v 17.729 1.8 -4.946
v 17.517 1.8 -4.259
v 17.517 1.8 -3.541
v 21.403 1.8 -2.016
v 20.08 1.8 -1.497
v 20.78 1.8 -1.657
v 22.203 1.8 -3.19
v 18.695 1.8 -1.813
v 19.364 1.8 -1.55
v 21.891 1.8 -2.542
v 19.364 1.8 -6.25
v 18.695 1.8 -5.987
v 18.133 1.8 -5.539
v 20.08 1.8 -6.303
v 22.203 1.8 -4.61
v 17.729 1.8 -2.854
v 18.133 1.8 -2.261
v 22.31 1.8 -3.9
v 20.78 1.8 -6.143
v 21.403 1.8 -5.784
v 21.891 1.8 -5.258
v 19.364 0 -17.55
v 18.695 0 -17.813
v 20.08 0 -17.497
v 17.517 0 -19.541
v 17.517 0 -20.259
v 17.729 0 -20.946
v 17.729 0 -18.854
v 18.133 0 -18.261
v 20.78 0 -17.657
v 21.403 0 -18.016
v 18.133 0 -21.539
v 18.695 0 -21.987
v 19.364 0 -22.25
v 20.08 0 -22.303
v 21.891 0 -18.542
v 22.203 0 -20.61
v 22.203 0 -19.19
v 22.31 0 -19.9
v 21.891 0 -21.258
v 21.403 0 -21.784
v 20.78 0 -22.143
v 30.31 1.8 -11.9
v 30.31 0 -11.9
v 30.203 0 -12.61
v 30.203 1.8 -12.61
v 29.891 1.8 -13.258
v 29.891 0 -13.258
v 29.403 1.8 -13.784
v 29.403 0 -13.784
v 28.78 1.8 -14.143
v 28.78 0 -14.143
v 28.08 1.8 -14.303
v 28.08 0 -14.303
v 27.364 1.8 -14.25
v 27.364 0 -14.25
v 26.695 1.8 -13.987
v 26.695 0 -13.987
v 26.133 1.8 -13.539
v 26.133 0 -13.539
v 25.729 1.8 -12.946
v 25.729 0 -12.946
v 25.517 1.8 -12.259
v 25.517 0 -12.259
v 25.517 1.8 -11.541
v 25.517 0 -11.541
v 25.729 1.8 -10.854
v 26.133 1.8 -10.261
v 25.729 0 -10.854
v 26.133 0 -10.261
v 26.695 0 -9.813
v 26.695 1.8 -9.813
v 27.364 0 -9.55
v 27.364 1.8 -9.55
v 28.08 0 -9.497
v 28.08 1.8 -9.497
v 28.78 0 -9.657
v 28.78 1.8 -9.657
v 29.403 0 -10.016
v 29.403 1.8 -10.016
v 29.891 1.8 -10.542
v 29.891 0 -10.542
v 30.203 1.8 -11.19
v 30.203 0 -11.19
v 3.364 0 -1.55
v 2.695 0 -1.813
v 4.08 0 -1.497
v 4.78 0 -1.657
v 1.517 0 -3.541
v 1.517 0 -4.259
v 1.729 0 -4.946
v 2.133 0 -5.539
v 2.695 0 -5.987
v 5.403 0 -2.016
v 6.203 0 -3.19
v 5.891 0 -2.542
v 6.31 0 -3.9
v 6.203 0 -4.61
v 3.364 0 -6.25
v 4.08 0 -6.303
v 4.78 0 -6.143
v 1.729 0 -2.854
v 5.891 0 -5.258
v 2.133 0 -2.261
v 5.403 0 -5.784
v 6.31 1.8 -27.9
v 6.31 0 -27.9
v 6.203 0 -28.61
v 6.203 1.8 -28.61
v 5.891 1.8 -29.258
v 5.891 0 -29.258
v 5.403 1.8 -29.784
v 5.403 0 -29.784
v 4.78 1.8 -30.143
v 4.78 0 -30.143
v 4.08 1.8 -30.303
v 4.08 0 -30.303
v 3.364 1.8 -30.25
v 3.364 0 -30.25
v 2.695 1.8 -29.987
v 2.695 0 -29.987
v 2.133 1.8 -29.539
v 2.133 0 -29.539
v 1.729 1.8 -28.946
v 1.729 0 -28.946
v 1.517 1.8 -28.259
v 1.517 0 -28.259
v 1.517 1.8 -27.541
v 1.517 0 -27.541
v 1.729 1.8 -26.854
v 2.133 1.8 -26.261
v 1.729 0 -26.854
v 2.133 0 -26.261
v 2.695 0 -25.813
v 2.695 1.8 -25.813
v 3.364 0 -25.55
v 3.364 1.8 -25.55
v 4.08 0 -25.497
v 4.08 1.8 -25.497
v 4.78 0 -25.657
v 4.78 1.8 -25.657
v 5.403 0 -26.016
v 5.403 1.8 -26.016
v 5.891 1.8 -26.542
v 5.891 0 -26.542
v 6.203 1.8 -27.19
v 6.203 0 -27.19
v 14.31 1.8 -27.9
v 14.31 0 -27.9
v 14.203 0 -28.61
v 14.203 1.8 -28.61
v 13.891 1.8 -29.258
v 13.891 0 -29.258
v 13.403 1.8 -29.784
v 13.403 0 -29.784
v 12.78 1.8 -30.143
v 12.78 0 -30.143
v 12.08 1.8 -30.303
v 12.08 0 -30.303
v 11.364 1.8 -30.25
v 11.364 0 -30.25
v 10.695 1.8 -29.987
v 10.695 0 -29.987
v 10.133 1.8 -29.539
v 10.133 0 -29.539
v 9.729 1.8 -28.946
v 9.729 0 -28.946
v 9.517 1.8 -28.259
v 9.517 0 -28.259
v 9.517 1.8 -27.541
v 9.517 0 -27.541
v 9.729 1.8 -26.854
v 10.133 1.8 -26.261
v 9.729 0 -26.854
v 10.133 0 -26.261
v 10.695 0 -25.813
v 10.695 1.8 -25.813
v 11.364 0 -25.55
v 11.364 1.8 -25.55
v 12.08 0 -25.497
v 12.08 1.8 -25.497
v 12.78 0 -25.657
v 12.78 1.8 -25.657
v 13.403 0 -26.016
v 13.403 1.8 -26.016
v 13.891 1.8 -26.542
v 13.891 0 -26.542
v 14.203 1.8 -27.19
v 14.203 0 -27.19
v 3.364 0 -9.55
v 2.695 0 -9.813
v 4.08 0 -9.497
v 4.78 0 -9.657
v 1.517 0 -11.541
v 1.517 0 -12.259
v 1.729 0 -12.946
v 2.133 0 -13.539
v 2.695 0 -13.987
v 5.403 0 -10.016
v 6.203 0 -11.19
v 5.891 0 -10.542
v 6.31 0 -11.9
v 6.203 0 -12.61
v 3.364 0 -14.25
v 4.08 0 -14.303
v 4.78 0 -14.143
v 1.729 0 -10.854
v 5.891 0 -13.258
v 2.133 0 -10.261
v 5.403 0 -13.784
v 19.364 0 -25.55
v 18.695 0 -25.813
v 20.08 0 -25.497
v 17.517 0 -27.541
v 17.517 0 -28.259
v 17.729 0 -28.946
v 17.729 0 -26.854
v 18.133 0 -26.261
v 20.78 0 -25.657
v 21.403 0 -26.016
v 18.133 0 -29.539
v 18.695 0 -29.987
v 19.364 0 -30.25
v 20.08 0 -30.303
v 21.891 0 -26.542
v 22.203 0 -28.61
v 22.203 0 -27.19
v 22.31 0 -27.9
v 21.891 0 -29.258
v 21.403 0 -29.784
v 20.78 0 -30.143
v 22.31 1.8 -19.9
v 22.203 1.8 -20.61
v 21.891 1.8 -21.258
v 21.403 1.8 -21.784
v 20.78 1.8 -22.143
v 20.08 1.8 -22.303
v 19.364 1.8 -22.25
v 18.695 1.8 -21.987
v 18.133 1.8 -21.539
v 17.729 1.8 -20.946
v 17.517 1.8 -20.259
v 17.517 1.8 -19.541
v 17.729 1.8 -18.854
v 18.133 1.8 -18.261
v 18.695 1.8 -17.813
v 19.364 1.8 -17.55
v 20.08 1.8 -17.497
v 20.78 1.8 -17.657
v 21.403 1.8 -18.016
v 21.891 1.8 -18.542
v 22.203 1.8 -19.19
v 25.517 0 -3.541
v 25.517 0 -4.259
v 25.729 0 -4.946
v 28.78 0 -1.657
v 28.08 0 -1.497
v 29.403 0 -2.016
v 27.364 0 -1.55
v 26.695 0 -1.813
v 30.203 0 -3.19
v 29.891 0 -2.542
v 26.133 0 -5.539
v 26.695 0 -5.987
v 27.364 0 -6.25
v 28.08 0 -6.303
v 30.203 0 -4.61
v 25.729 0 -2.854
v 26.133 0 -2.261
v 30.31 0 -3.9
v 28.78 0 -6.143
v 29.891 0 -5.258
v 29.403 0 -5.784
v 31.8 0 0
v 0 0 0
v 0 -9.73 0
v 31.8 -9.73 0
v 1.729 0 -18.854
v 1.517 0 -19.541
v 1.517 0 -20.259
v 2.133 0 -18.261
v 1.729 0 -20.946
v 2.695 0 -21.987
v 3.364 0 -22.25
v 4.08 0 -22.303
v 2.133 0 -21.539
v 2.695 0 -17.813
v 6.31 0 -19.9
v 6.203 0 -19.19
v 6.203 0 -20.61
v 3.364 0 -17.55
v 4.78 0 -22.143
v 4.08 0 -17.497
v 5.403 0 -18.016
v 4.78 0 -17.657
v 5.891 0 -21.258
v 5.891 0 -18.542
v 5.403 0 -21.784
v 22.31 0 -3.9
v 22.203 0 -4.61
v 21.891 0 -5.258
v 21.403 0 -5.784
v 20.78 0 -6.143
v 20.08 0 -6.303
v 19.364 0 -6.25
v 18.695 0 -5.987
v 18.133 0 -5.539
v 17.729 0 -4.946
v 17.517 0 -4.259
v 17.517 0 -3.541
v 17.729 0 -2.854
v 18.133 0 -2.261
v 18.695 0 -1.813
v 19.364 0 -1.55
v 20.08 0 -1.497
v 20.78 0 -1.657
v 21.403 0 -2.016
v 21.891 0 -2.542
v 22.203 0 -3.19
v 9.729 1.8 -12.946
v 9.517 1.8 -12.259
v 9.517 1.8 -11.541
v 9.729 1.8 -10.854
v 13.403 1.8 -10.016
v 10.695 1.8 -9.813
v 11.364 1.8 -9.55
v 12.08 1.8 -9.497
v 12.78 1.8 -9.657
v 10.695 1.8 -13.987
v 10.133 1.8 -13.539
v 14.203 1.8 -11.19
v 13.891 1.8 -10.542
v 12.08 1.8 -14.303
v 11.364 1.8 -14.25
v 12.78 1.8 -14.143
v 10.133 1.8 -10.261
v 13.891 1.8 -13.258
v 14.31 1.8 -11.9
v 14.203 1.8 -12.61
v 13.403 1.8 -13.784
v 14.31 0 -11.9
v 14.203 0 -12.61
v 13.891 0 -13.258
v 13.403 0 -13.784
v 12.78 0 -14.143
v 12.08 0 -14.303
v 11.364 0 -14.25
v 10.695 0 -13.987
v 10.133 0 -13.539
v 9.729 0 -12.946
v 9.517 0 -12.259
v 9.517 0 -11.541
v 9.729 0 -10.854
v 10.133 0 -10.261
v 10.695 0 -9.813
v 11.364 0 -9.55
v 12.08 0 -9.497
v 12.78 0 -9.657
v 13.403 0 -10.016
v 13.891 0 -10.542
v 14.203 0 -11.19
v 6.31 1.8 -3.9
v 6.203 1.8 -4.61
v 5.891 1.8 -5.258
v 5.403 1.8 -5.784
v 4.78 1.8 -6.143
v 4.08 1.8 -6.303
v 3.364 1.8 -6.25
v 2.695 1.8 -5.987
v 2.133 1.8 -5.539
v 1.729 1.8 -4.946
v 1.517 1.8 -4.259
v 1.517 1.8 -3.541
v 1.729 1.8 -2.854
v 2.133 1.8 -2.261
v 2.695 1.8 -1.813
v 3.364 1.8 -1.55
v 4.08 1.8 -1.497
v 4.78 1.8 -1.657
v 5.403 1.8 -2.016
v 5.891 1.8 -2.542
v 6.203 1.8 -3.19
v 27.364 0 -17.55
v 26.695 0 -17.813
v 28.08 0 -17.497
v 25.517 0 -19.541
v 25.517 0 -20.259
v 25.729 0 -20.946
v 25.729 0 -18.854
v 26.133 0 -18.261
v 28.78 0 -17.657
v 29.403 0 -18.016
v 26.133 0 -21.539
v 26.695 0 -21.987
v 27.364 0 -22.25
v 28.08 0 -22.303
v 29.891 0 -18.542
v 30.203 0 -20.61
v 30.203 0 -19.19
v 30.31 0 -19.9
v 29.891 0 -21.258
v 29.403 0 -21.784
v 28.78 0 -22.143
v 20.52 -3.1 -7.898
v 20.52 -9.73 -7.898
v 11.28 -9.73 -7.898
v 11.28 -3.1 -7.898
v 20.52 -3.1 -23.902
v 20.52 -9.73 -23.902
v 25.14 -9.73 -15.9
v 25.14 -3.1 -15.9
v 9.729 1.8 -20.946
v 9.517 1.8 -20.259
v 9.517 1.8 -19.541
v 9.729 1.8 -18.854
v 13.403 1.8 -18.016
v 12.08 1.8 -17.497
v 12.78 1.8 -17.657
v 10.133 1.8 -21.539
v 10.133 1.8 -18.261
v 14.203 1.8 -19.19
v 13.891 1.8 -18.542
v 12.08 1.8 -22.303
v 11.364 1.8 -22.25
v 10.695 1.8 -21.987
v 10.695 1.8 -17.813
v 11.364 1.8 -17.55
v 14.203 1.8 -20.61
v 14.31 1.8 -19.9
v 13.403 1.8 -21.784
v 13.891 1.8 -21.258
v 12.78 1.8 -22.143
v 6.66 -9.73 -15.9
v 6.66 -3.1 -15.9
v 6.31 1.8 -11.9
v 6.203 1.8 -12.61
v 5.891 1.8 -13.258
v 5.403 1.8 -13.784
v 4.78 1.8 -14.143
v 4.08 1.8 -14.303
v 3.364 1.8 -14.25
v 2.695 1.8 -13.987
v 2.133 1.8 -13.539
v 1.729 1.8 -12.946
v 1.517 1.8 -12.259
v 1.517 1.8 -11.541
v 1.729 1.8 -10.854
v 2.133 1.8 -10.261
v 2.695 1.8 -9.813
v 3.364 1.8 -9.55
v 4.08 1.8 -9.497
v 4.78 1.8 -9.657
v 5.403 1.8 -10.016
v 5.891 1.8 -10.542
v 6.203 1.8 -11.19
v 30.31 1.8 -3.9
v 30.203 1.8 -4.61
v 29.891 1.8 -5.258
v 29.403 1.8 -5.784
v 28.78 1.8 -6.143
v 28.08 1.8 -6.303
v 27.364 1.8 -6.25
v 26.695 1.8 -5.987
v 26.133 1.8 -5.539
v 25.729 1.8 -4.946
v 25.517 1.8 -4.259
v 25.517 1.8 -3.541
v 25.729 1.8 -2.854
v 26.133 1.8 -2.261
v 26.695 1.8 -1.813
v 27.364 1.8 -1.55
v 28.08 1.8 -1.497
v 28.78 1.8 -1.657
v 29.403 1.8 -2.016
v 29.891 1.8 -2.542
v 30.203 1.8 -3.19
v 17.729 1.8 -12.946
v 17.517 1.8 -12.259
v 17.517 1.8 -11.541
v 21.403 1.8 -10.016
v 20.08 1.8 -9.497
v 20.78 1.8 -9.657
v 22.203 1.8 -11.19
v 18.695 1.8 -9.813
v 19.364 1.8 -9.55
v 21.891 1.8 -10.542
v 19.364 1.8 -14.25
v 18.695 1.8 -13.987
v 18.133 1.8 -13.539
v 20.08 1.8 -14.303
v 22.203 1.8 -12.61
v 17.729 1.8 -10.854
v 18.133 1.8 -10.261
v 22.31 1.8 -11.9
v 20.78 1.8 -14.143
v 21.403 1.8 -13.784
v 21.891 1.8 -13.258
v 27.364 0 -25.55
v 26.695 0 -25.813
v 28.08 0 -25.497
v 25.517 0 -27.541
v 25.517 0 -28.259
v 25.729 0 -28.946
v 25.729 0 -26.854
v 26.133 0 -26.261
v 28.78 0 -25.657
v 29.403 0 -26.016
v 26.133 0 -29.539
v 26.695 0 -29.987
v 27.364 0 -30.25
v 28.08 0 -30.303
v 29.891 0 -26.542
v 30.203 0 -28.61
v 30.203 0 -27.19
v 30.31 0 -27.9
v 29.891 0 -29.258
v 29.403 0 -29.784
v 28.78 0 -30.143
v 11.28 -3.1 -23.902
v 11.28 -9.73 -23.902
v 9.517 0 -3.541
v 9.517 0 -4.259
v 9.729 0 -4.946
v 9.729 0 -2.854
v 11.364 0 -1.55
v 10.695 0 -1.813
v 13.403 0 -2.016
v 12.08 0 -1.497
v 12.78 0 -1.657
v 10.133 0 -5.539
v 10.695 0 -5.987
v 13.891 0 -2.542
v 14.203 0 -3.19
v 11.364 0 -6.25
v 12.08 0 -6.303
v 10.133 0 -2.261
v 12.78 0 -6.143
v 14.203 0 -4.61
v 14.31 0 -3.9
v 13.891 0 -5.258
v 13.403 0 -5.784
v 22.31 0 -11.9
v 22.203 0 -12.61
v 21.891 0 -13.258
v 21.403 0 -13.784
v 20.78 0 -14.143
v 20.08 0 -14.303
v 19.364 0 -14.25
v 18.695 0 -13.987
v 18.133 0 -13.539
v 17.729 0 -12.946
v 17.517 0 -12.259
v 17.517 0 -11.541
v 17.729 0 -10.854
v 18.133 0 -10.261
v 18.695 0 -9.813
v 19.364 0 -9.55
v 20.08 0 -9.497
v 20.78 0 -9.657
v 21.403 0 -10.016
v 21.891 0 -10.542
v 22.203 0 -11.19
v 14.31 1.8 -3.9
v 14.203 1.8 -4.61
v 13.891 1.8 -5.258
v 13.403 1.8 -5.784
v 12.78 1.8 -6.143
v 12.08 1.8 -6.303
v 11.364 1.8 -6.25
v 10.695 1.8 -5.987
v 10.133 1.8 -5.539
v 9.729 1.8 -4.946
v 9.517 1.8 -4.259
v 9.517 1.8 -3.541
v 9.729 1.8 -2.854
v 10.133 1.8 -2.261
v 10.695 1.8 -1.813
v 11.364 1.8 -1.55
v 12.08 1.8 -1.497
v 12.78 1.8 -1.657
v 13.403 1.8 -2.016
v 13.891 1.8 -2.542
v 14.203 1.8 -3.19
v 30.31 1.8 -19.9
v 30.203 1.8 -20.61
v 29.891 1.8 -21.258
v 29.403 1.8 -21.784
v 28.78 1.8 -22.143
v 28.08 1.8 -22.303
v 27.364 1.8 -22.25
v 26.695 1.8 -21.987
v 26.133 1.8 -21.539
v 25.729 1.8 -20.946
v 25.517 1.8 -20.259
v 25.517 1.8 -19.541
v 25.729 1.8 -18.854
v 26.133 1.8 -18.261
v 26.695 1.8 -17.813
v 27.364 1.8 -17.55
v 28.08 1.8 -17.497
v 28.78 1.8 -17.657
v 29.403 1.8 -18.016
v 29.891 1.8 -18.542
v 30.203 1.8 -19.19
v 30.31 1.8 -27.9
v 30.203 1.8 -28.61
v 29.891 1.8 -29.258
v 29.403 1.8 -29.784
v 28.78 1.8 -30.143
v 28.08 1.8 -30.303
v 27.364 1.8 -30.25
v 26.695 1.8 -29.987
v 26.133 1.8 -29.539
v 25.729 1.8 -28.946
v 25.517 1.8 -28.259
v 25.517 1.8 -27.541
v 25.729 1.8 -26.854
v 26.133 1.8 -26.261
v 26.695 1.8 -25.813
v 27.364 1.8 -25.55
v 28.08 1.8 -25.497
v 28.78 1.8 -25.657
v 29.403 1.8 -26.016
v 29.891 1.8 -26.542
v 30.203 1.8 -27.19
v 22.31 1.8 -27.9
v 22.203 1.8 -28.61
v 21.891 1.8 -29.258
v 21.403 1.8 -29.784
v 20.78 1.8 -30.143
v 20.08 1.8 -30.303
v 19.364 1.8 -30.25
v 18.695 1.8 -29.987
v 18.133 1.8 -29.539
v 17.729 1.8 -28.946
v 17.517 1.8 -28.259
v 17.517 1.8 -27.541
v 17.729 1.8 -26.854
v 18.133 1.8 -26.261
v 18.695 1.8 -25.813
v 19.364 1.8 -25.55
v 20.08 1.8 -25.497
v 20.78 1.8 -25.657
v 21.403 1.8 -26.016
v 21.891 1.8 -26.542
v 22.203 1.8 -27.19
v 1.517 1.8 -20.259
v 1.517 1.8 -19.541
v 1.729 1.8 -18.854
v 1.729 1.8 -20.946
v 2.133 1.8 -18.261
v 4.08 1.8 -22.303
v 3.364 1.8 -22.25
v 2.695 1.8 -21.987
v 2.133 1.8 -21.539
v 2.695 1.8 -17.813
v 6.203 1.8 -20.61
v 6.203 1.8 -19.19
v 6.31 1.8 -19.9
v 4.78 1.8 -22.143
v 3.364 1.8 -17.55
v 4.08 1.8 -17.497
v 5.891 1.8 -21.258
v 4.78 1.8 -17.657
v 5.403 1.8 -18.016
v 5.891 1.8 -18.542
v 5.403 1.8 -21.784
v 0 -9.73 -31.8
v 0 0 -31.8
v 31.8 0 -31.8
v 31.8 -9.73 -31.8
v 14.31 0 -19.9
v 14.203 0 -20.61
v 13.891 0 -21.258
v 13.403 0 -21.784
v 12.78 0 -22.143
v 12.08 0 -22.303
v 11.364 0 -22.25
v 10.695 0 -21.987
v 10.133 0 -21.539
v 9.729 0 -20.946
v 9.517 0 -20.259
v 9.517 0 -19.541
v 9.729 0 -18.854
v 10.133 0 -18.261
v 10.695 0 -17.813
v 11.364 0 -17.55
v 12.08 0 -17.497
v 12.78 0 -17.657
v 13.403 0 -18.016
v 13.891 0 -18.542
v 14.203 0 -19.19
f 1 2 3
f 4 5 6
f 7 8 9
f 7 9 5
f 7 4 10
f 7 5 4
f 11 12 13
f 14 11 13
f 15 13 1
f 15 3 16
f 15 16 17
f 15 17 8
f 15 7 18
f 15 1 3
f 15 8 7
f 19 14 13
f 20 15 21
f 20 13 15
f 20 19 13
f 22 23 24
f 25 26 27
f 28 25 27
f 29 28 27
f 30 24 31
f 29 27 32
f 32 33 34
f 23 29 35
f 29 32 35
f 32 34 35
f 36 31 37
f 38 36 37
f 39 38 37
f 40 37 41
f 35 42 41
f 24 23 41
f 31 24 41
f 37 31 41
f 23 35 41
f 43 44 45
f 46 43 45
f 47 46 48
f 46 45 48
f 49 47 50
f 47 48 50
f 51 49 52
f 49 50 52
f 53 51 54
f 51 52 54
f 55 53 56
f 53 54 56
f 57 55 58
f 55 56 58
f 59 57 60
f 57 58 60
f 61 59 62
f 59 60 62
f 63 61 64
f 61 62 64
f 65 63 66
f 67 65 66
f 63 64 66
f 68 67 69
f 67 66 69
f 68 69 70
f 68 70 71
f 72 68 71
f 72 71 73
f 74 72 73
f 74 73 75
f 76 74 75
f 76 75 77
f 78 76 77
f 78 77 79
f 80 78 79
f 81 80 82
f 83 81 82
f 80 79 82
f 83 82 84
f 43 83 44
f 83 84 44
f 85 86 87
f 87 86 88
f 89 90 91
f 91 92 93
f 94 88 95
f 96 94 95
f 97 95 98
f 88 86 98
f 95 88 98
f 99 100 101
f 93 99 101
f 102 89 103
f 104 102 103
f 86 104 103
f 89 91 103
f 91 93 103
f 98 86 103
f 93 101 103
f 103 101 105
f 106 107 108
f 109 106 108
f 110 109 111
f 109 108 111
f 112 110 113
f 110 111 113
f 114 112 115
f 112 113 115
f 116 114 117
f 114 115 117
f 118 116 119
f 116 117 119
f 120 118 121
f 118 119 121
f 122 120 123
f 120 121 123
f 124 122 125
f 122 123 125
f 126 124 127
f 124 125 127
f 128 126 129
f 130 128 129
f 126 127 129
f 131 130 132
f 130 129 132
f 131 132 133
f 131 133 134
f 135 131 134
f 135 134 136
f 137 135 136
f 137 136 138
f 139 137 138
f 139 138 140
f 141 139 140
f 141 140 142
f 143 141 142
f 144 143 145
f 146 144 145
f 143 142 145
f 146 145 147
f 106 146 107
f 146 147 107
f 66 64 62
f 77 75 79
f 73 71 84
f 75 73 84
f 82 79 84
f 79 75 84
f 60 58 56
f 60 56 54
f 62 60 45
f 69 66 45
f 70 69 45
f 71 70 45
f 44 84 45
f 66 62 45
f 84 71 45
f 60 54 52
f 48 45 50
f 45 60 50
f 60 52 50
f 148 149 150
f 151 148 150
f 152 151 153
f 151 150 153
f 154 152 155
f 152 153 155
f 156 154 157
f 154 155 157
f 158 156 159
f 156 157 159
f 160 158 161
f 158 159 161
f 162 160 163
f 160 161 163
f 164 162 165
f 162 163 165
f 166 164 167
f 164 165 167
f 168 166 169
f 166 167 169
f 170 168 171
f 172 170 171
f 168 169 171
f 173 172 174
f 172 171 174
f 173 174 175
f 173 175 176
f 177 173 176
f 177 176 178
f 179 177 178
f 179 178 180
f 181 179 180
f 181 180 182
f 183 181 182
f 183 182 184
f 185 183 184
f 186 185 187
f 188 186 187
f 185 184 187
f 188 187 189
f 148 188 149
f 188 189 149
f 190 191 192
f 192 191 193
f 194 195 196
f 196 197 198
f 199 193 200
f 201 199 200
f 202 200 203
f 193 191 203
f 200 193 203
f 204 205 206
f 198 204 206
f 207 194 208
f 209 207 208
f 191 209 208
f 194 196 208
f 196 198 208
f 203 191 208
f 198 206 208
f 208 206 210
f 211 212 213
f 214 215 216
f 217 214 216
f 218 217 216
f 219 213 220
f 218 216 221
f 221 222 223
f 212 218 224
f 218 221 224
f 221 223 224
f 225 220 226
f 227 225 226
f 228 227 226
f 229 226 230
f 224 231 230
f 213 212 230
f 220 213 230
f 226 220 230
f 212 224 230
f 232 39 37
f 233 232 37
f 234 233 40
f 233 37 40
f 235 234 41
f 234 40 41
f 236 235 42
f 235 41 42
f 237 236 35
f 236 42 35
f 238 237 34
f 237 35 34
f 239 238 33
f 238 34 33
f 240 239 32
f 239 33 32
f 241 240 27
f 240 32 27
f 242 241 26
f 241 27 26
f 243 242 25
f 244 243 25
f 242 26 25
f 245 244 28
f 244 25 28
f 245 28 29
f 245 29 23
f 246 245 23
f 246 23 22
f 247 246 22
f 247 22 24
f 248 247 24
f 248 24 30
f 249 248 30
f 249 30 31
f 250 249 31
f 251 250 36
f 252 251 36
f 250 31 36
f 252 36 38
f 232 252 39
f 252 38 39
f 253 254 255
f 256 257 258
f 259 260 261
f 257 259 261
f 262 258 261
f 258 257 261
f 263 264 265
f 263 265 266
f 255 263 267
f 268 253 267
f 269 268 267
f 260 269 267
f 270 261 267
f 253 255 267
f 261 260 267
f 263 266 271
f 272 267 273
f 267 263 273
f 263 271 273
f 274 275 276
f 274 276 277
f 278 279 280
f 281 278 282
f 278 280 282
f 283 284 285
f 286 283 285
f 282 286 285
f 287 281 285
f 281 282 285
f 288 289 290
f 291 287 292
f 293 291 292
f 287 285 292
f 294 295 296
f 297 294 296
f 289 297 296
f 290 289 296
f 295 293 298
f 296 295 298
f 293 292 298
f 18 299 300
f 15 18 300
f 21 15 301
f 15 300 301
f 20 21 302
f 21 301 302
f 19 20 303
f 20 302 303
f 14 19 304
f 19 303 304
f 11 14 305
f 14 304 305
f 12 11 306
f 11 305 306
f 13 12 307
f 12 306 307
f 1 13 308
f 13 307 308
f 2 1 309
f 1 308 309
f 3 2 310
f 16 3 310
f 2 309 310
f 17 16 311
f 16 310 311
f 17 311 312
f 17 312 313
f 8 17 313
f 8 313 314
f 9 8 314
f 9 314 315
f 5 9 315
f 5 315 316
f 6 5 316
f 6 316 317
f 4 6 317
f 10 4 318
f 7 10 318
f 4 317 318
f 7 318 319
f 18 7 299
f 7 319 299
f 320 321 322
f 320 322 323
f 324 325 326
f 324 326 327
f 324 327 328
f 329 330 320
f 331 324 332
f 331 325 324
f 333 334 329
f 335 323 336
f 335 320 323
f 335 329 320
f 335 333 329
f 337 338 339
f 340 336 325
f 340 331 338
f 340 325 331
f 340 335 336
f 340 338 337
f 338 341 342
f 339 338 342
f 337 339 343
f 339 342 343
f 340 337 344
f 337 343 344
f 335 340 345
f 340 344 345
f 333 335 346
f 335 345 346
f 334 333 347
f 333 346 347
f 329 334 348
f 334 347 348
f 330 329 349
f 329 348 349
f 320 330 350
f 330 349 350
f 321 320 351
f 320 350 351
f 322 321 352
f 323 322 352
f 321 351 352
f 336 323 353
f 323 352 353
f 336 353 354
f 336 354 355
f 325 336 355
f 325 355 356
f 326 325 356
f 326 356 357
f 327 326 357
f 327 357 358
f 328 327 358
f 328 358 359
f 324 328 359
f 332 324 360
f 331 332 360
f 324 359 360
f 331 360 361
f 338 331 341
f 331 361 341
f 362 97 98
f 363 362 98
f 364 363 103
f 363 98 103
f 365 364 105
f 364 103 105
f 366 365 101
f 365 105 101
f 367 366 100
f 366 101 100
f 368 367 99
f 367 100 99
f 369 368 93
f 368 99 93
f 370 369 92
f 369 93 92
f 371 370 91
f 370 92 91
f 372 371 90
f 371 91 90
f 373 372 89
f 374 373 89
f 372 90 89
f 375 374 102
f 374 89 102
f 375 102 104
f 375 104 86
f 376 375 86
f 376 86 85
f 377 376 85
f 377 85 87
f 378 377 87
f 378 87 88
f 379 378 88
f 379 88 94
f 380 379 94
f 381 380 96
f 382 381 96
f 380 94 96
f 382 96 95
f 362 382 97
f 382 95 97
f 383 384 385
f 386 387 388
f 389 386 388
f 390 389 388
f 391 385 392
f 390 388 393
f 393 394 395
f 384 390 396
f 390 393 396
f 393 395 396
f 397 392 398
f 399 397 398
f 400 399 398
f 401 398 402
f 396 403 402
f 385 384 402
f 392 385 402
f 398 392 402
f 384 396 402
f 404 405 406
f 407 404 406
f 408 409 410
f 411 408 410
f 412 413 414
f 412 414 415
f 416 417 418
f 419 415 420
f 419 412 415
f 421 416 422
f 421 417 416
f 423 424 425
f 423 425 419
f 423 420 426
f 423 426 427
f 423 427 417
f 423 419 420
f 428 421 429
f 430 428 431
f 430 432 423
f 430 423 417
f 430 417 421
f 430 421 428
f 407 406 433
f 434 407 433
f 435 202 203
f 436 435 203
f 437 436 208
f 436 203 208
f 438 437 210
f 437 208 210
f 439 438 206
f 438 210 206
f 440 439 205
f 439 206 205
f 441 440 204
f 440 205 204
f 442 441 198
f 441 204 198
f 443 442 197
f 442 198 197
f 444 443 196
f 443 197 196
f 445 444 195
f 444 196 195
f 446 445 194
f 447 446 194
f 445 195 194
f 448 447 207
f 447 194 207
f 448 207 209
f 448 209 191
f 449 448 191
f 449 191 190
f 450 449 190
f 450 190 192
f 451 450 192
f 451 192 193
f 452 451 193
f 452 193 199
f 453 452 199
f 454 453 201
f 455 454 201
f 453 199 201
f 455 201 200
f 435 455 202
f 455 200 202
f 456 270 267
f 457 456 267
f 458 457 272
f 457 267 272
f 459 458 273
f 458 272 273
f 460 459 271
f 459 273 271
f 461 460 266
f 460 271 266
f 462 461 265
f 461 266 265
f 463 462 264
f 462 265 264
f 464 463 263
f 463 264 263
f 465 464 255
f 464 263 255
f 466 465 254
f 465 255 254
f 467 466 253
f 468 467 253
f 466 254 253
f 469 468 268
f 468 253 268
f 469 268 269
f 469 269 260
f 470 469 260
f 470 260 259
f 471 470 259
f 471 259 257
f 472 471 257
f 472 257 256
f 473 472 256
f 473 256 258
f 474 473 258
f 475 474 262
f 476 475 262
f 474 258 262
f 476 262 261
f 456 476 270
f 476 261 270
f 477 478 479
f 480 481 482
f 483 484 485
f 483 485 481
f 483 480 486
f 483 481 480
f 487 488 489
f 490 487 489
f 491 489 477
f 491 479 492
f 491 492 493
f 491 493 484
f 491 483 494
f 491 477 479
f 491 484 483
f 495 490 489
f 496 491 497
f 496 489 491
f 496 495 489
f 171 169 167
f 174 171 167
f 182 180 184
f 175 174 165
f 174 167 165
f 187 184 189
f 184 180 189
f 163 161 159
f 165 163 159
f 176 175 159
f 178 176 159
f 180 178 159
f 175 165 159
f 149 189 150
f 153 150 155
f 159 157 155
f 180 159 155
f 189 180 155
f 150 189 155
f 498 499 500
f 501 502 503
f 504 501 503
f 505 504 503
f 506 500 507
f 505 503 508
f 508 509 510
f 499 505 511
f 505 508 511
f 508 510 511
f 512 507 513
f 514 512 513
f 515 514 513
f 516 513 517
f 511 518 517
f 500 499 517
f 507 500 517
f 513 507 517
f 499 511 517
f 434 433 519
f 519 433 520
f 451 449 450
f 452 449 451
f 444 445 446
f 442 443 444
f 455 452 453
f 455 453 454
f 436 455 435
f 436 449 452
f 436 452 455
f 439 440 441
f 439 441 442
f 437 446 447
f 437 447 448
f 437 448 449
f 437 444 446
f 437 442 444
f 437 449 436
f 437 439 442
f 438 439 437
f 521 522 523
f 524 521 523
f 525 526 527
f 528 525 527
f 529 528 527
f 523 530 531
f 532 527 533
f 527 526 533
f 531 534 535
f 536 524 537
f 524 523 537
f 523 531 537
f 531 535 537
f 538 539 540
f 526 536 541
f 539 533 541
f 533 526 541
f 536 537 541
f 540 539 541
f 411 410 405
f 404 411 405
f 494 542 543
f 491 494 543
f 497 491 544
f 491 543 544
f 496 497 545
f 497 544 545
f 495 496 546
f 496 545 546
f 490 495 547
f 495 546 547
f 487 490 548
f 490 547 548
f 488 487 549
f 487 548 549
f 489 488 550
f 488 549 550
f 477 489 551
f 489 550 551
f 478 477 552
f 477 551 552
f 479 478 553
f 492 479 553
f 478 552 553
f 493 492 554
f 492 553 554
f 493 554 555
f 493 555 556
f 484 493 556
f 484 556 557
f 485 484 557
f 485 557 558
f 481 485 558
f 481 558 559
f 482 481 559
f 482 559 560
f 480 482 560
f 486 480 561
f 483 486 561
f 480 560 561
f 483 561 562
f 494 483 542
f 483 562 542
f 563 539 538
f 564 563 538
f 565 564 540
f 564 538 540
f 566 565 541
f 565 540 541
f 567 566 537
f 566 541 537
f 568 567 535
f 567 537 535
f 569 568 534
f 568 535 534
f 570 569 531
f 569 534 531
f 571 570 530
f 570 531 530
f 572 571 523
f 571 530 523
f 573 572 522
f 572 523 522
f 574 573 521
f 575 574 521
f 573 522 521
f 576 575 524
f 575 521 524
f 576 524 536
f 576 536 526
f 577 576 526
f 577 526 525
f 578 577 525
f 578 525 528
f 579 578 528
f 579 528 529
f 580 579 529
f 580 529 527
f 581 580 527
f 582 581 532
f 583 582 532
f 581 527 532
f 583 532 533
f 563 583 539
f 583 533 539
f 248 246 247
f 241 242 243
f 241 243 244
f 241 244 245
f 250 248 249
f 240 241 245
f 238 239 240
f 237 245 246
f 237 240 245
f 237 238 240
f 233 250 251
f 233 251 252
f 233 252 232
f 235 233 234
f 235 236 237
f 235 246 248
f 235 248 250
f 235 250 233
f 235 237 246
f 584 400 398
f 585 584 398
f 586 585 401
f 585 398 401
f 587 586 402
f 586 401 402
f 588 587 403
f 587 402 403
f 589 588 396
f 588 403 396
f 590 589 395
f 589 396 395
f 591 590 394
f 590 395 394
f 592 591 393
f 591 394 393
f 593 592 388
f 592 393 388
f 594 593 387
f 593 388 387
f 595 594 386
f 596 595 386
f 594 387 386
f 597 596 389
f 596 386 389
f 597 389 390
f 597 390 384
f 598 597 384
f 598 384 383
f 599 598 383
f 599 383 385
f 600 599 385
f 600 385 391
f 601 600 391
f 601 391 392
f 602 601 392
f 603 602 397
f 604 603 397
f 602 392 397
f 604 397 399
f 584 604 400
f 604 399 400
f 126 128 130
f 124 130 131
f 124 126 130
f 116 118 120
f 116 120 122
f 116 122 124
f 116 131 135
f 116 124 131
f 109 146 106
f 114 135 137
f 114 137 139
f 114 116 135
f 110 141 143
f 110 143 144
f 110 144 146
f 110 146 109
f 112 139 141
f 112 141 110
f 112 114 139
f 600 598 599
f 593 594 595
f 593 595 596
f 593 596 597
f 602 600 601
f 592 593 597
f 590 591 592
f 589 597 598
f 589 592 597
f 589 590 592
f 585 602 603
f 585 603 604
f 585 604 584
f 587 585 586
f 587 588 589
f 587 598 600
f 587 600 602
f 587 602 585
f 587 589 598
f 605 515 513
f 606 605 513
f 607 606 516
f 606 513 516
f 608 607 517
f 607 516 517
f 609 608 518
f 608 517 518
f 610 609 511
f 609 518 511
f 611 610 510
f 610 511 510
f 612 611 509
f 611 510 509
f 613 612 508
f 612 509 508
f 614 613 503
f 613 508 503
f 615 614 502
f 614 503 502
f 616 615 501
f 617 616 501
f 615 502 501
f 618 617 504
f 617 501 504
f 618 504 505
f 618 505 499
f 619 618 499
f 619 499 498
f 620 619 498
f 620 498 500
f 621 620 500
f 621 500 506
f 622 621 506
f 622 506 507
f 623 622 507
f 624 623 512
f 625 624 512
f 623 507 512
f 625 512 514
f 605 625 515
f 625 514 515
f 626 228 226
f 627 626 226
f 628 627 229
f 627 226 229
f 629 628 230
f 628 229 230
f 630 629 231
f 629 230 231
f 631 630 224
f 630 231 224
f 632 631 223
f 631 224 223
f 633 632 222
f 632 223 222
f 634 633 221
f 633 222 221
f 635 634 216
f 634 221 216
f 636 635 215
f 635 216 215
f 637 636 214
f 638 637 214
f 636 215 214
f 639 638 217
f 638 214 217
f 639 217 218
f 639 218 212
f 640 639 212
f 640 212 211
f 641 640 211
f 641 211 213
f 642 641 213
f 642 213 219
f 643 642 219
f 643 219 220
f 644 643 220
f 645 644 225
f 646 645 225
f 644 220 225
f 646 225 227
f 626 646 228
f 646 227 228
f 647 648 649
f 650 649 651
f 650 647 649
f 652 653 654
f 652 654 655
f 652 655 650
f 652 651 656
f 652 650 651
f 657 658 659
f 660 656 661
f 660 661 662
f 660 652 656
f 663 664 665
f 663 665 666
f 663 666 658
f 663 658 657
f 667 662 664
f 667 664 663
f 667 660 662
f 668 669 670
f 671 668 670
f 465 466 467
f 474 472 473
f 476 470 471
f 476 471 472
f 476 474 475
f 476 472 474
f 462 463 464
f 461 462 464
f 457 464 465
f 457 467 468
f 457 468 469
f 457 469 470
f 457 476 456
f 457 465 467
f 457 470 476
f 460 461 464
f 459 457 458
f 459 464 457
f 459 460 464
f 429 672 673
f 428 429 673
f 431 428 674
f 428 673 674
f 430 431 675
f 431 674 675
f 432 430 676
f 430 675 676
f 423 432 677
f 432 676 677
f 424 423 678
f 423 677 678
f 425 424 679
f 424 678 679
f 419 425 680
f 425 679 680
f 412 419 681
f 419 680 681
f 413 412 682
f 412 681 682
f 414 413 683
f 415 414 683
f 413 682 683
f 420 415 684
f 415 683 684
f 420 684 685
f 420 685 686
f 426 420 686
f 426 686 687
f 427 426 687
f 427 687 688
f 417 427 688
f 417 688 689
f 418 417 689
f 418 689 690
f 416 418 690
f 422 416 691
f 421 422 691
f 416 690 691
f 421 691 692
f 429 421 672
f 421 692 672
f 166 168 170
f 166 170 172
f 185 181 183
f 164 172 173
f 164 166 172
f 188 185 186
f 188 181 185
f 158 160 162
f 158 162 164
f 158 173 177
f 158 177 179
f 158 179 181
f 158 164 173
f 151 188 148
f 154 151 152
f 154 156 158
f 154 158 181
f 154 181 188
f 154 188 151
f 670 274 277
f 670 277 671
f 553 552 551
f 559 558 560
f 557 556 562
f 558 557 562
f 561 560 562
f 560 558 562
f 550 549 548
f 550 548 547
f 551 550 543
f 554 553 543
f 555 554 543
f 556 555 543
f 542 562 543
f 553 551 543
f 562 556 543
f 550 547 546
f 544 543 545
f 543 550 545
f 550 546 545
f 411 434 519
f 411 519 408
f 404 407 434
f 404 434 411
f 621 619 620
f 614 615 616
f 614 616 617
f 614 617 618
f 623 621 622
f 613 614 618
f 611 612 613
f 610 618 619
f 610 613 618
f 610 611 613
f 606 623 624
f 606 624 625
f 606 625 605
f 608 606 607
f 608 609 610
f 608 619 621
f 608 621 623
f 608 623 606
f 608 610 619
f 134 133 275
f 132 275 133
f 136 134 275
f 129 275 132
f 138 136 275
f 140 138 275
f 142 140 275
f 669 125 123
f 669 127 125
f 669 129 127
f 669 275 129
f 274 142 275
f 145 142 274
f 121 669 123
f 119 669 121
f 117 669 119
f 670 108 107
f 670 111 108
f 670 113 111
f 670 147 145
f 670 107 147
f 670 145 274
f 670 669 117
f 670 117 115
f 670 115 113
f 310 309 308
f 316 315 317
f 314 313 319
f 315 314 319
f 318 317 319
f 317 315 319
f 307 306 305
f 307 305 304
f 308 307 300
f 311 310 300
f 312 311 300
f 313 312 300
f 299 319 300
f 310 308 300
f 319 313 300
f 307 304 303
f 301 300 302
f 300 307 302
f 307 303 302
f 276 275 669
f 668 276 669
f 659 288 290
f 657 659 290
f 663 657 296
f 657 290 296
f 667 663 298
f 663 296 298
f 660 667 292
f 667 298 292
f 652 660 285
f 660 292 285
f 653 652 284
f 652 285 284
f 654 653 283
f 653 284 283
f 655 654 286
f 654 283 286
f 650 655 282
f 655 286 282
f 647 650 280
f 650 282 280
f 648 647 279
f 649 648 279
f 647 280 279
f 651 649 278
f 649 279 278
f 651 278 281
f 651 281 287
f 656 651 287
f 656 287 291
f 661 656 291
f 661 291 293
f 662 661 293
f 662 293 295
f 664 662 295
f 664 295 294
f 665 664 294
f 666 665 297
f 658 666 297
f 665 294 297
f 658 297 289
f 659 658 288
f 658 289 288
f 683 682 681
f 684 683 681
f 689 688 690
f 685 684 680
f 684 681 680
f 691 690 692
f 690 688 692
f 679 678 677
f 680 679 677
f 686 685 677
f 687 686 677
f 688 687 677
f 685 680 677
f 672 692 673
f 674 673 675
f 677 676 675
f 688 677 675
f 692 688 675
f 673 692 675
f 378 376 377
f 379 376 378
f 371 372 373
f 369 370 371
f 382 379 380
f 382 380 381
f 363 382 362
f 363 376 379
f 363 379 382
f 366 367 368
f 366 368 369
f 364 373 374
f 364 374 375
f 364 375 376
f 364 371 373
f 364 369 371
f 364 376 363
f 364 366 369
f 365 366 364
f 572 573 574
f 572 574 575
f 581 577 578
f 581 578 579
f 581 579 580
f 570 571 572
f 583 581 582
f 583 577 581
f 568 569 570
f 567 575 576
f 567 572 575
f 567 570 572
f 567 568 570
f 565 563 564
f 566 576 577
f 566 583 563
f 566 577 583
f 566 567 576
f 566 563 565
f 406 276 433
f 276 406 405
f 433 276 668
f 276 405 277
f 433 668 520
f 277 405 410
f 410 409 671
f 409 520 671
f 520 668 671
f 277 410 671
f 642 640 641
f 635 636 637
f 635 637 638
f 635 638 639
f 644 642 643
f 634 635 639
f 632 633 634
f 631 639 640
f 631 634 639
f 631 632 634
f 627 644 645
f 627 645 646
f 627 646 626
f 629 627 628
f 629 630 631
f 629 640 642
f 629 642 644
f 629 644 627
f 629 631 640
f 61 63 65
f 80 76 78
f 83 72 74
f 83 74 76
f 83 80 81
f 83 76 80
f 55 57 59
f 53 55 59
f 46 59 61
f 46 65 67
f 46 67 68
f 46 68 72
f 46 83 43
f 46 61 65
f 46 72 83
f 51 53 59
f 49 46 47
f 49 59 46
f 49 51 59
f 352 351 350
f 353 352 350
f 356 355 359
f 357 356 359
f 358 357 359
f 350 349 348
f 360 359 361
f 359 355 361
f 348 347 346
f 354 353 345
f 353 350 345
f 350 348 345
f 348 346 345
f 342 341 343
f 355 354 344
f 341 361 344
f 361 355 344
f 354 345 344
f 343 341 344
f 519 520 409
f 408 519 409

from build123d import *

# Parameters (mm, degrees)
SKETCH2_R              = 2.41
BOSS_EXTRUDE1_DEPTH    = 1.8
BOSS_EXTRUDE1_2_DEPTH  = 1.8
BOSS_EXTRUDE1_3_DEPTH  = 1.8
BOSS_EXTRUDE1_4_DEPTH  = 1.8
BOSS_EXTRUDE1_5_DEPTH  = 1.8
BOSS_EXTRUDE1_6_DEPTH  = 1.8
BOSS_EXTRUDE1_7_DEPTH  = 1.8
BOSS_EXTRUDE1_8_DEPTH  = 1.8
BOSS_EXTRUDE1_9_DEPTH  = 1.8
BOSS_EXTRUDE1_10_DEPTH = 1.8
BOSS_EXTRUDE1_11_DEPTH = 1.8
BOSS_EXTRUDE1_12_DEPTH = 1.8
BOSS_EXTRUDE1_13_DEPTH = 1.8
BOSS_EXTRUDE1_14_DEPTH = 1.8
BOSS_EXTRUDE1_15_DEPTH = 1.8
BOSS_EXTRUDE1_16_DEPTH = 1.8
SKETCH1_W              = 31.8
SKETCH1_H              = 31.8
BOSS_EXTRUDE2_DEPTH    = 9.73
CUT_EXTRUDE1_DEPTH     = 6.63


with BuildPart() as part:
    # Sketch2 → Boss-Extrude1 (new body)
    with BuildSketch(Plane(origin=(0, 0, 0), x_dir=(1, 0, 0), z_dir=(0, 1, 0))):
        with Locations((3.9, 27.9)):
            Circle(SKETCH2_R)
    extrude(amount=BOSS_EXTRUDE1_DEPTH)

    # Sketch1 → Boss-Extrude2 (add)
    with BuildSketch(Plane(origin=(0, 0, 0), x_dir=(1, 0, 0), z_dir=(0, 1, 0))):
        with Locations((15.9, 15.9)):
            Rectangle(SKETCH1_W, SKETCH1_H)
    extrude(amount=-BOSS_EXTRUDE2_DEPTH)

    # Sketch4 → Cut-Extrude1 (cut)
    with BuildSketch(Plane.XZ.offset(9.73)):
        Polygon((25.14, -15.9), (20.52, -7.897925269), (11.28, -7.897925269), (6.66, -15.9), (11.28, -23.902074731), (20.52, -23.902074731), align=None)
    extrude(amount=-CUT_EXTRUDE1_DEPTH, mode=Mode.SUBTRACT)


with BuildPart() as body_2:
    # Sketch2 → Boss-Extrude1 2 (new body)
    with BuildSketch(Plane(origin=(0, 0, 0), x_dir=(1, 0, 0), z_dir=(0, 1, 0))):
        with Locations((11.9, 27.9)):
            Circle(SKETCH2_R)
    extrude(amount=BOSS_EXTRUDE1_2_DEPTH)


with BuildPart() as body_3:
    # Sketch2 → Boss-Extrude1 3 (new body)
    with BuildSketch(Plane(origin=(0, 0, 0), x_dir=(1, 0, 0), z_dir=(0, 1, 0))):
        with Locations((19.9, 27.9)):
            Circle(SKETCH2_R)
    extrude(amount=BOSS_EXTRUDE1_3_DEPTH)


with BuildPart() as body_4:
    # Sketch2 → Boss-Extrude1 4 (new body)
    with BuildSketch(Plane(origin=(0, 0, 0), x_dir=(1, 0, 0), z_dir=(0, 1, 0))):
        with Locations((27.9, 27.9)):
            Circle(SKETCH2_R)
    extrude(amount=BOSS_EXTRUDE1_4_DEPTH)


with BuildPart() as body_5:
    # Sketch2 → Boss-Extrude1 5 (new body)
    with BuildSketch(Plane(origin=(0, 0, 0), x_dir=(1, 0, 0), z_dir=(0, 1, 0))):
        with Locations((11.9, 19.9)):
            Circle(SKETCH2_R)
    extrude(amount=BOSS_EXTRUDE1_5_DEPTH)


with BuildPart() as body_6:
    # Sketch2 → Boss-Extrude1 6 (new body)
    with BuildSketch(Plane(origin=(0, 0, 0), x_dir=(1, 0, 0), z_dir=(0, 1, 0))):
        with Locations((19.9, 19.9)):
            Circle(SKETCH2_R)
    extrude(amount=BOSS_EXTRUDE1_6_DEPTH)


with BuildPart() as body_7:
    # Sketch2 → Boss-Extrude1 7 (new body)
    with BuildSketch(Plane(origin=(0, 0, 0), x_dir=(1, 0, 0), z_dir=(0, 1, 0))):
        with Locations((27.9, 19.9)):
            Circle(SKETCH2_R)
    extrude(amount=BOSS_EXTRUDE1_7_DEPTH)


with BuildPart() as body_8:
    # Sketch2 → Boss-Extrude1 8 (new body)
    with BuildSketch(Plane(origin=(0, 0, 0), x_dir=(1, 0, 0), z_dir=(0, 1, 0))):
        with Locations((11.9, 11.9)):
            Circle(SKETCH2_R)
    extrude(amount=BOSS_EXTRUDE1_8_DEPTH)


with BuildPart() as body_9:
    # Sketch2 → Boss-Extrude1 9 (new body)
    with BuildSketch(Plane(origin=(0, 0, 0), x_dir=(1, 0, 0), z_dir=(0, 1, 0))):
        with Locations((19.9, 11.9)):
            Circle(SKETCH2_R)
    extrude(amount=BOSS_EXTRUDE1_9_DEPTH)


with BuildPart() as body_10:
    # Sketch2 → Boss-Extrude1 10 (new body)
    with BuildSketch(Plane(origin=(0, 0, 0), x_dir=(1, 0, 0), z_dir=(0, 1, 0))):
        with Locations((27.9, 11.9)):
            Circle(SKETCH2_R)
    extrude(amount=BOSS_EXTRUDE1_10_DEPTH)


with BuildPart() as body_11:
    # Sketch2 → Boss-Extrude1 11 (new body)
    with BuildSketch(Plane(origin=(0, 0, 0), x_dir=(1, 0, 0), z_dir=(0, 1, 0))):
        with Locations((11.9, 3.9)):
            Circle(SKETCH2_R)
    extrude(amount=BOSS_EXTRUDE1_11_DEPTH)


with BuildPart() as body_12:
    # Sketch2 → Boss-Extrude1 12 (new body)
    with BuildSketch(Plane(origin=(0, 0, 0), x_dir=(1, 0, 0), z_dir=(0, 1, 0))):
        with Locations((19.9, 3.9)):
            Circle(SKETCH2_R)
    extrude(amount=BOSS_EXTRUDE1_12_DEPTH)


with BuildPart() as body_13:
    # Sketch2 → Boss-Extrude1 13 (new body)
    with BuildSketch(Plane(origin=(0, 0, 0), x_dir=(1, 0, 0), z_dir=(0, 1, 0))):
        with Locations((27.9, 3.9)):
            Circle(SKETCH2_R)
    extrude(amount=BOSS_EXTRUDE1_13_DEPTH)


with BuildPart() as body_14:
    # Sketch2 → Boss-Extrude1 14 (new body)
    with BuildSketch(Plane(origin=(0, 0, 0), x_dir=(1, 0, 0), z_dir=(0, 1, 0))):
        with Locations((3.9, 19.9)):
            Circle(SKETCH2_R)
    extrude(amount=BOSS_EXTRUDE1_14_DEPTH)


with BuildPart() as body_15:
    # Sketch2 → Boss-Extrude1 15 (new body)
    with BuildSketch(Plane(origin=(0, 0, 0), x_dir=(1, 0, 0), z_dir=(0, 1, 0))):
        with Locations((3.9, 11.9)):
            Circle(SKETCH2_R)
    extrude(amount=BOSS_EXTRUDE1_15_DEPTH)


with BuildPart() as body_16:
    # Sketch2 → Boss-Extrude1 16 (new body)
    with BuildSketch(Plane(origin=(0, 0, 0), x_dir=(1, 0, 0), z_dir=(0, 1, 0))):
        with Locations((3.9, 3.9)):
            Circle(SKETCH2_R)
    extrude(amount=BOSS_EXTRUDE1_16_DEPTH)


solid = Compound([part.part, body_2.part, body_3.part, body_4.part, body_5.part, body_6.part, body_7.part, body_8.part, body_9.part, body_10.part, body_11.part, body_12.part, body_13.part, body_14.part, body_15.part, body_16.part])
